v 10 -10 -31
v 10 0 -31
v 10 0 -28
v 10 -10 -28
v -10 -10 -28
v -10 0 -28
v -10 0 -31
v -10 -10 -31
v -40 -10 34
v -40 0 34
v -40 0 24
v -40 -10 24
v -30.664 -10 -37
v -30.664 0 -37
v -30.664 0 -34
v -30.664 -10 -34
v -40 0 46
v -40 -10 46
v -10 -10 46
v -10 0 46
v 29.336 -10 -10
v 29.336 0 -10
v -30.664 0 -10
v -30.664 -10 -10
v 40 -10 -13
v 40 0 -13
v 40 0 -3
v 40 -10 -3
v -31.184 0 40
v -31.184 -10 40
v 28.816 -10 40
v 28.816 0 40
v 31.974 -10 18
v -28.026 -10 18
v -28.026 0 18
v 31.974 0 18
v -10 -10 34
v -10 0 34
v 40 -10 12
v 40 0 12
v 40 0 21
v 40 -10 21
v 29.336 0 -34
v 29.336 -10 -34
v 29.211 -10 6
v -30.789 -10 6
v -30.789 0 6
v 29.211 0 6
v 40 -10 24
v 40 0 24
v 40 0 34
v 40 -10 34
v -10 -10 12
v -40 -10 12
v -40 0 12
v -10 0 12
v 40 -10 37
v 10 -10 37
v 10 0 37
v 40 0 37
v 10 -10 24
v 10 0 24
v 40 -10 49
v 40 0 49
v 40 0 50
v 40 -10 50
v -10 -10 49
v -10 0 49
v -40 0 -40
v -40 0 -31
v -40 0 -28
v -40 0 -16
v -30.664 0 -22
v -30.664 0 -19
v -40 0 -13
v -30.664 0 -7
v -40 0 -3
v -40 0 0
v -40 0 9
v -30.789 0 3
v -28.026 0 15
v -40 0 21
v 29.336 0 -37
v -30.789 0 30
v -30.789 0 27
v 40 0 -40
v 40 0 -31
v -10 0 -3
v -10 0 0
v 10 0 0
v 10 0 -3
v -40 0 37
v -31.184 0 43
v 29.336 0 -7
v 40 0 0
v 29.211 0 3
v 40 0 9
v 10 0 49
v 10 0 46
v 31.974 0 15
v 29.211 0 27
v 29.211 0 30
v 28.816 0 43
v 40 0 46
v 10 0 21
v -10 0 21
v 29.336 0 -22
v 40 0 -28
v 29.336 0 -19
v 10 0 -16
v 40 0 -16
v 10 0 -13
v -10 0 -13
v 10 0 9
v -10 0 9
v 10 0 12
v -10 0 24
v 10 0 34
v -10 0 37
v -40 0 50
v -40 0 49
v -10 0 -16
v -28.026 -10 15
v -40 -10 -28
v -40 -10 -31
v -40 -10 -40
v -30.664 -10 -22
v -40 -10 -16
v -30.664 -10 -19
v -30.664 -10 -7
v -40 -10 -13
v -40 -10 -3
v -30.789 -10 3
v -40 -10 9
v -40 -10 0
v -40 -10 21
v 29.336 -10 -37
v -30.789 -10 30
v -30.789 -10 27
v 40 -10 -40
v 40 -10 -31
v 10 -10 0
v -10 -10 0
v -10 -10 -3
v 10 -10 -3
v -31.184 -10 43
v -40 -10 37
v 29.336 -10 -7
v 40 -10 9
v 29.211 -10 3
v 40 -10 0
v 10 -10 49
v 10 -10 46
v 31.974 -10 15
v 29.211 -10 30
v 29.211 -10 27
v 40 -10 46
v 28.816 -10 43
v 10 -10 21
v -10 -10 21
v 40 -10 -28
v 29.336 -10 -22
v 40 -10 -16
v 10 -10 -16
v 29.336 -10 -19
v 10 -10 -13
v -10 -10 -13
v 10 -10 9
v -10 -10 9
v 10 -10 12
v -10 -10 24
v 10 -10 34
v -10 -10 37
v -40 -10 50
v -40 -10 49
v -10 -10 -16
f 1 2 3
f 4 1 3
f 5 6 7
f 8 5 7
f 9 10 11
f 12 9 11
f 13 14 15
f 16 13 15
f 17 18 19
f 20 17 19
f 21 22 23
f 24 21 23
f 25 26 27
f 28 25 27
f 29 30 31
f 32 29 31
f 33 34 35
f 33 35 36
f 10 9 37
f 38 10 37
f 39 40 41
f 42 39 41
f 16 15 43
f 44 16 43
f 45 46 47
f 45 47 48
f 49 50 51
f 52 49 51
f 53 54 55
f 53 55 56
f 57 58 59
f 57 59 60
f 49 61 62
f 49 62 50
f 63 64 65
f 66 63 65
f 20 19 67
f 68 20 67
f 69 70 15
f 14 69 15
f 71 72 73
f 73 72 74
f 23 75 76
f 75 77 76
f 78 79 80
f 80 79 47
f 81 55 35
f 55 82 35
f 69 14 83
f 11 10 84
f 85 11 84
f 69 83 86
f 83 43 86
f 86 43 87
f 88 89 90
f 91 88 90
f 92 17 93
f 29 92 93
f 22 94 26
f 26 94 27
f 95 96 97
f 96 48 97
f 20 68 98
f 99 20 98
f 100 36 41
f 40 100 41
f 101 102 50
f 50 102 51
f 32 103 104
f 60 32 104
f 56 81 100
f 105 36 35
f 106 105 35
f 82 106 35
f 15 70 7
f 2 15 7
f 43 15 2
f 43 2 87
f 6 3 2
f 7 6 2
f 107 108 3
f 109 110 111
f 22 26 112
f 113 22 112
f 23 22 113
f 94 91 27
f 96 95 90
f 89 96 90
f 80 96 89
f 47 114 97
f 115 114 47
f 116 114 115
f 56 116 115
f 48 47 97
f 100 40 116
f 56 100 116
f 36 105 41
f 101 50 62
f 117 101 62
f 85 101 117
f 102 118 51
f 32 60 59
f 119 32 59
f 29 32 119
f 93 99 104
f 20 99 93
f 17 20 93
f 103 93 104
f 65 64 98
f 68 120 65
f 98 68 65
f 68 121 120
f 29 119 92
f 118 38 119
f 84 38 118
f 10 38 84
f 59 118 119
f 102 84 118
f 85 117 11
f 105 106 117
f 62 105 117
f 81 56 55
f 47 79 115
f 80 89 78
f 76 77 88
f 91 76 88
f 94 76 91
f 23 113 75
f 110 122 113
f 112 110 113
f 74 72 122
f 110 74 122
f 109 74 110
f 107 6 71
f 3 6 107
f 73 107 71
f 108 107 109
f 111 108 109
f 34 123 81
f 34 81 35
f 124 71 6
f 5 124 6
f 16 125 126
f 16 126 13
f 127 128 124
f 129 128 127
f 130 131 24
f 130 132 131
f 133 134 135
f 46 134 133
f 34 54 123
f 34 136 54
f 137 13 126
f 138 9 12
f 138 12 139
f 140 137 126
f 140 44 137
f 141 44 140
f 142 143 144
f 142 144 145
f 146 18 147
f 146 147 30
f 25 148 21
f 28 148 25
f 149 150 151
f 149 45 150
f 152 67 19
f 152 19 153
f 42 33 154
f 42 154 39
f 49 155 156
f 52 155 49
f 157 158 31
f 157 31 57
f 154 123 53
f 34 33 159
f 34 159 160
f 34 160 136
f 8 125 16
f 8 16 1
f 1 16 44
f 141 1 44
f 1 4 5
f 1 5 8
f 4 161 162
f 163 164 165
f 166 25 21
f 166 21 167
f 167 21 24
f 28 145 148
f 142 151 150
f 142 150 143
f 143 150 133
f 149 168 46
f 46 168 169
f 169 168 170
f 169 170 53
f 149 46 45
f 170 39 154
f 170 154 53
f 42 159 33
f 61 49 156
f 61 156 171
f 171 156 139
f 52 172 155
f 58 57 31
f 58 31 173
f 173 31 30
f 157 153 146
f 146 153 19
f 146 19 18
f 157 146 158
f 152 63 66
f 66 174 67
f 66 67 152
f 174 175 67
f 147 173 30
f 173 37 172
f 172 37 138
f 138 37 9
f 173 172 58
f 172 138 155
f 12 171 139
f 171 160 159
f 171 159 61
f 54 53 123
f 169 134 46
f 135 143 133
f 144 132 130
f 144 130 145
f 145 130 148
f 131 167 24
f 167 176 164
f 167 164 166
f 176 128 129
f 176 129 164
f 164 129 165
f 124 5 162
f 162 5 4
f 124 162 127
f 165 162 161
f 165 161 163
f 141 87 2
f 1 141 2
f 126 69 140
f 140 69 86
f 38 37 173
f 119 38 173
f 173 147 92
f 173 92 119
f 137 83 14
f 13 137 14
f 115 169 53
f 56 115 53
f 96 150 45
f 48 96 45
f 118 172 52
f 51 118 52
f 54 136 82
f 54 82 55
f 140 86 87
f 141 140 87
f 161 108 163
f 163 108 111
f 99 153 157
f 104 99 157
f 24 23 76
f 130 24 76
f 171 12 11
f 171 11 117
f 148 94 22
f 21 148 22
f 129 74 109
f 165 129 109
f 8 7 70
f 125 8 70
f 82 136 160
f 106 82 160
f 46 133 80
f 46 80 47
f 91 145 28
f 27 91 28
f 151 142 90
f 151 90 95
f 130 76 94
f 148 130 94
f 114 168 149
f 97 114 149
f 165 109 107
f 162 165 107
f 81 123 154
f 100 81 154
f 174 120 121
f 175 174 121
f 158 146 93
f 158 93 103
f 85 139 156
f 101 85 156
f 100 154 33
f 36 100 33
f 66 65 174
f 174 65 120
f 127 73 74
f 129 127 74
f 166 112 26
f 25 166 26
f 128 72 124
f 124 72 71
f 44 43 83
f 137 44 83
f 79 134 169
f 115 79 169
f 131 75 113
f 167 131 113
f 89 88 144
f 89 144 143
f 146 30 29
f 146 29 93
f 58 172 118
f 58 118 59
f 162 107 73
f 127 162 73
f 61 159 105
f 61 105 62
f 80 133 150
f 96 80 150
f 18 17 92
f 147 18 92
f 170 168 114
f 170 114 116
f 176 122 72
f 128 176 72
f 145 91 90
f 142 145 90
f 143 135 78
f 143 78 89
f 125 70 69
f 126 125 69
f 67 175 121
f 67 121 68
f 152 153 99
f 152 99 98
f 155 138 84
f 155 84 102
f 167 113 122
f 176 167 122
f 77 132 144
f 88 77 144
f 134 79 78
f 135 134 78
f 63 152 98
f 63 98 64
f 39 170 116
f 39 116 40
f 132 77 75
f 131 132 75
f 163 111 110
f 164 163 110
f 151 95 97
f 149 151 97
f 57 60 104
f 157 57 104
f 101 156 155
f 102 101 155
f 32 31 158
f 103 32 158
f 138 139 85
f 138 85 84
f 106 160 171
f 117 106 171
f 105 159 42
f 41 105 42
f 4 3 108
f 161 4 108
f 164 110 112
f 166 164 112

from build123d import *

# Parameters (mm, degrees)
F1_DEPTH = 10
F2_W     = 30
F2_H     = 3
F2_W_2   = 60
F3_DEPTH = 25
F4_W     = 30
F4_H     = 3
F4_W_2   = 60
F5_DEPTH = 25


with BuildPart() as f1:
    # F0 (on Front) → F1 (new body)
    with BuildSketch(Plane.XZ):
        Polygon((-40, -40), (0, -40), (0, -37), (-30.663718, -37), (-30.663718, -34), (0, -34), (0, -22), (-30.663718, -22), (-30.663718, -19), (-21.106195, -19), (-20.50885, -19), (0, -19), (0, -10), (-30.663718, -10), (-30.663718, -7), (0, -7), (0, 50), (-40, 50), (-40, -13), (-10, -13), (-10, -16), (-20.50885, -16), (-21.106195, -16), (-40, -16), (-40, -28), (-10, -28), (-10, -31), (-40, -31), align=None)
        Polygon((0, -40), (40, -40), (40, -31), (10, -31), (10, -28), (40, -28), (40, -16), (10, -16), (10, -13), (40, -13), (40, 50), (0, 50), (0, -7), (29.336282, -7), (29.336282, -10), (0, -10), (0, -19), (29.336282, -19), (29.336282, -22), (0, -22), (0, -34), (29.336282, -34), (29.336282, -37), (0, -37), align=None)
    extrude(amount=F1_DEPTH)

    # F2 (on face) → F3 (cut)
    with BuildSketch(Plane.XZ.offset(10)):
        with Locations((-25, -1.5)):
            Rectangle(F2_W, F2_H)
        with Locations((25, -1.5)):
            Rectangle(F2_W, F2_H)
        with Locations((-0.789474, 4.5)):
            Rectangle(F2_W_2, F2_H)
        with Locations((-25, 10.5)):
            Rectangle(F2_W, F2_H)
        with Locations((25, 10.5)):
            Rectangle(F2_W, F2_H)
        with Locations((1.97369, 16.5)):
            Rectangle(F2_W_2, F2_H)
        with Locations((-25, 22.5)):
            Rectangle(F2_W, F2_H)
        with Locations((25, 22.5)):
            Rectangle(F2_W, F2_H)
        with Locations((-0.789474, 28.5)):
            Rectangle(F2_W_2, F2_H)
    extrude(amount=-F3_DEPTH, mode=Mode.SUBTRACT)

    # F4 (on face) → F5 (cut)
    with BuildSketch(Plane.XZ.offset(10)):
        with Locations((-25, 35.5)):
            Rectangle(F4_W, F4_H)
        with Locations((25, 35.5)):
            Rectangle(F4_W, F4_H)
        with Locations((-1.184211, 41.5)):
            Rectangle(F4_W_2, F4_H)
        with Locations((-25, 47.5)):
            Rectangle(F4_W, F4_H)
        with Locations((25, 47.5)):
            Rectangle(F4_W, F4_H)
    extrude(amount=-F5_DEPTH, mode=Mode.SUBTRACT)


solid = f1.part
